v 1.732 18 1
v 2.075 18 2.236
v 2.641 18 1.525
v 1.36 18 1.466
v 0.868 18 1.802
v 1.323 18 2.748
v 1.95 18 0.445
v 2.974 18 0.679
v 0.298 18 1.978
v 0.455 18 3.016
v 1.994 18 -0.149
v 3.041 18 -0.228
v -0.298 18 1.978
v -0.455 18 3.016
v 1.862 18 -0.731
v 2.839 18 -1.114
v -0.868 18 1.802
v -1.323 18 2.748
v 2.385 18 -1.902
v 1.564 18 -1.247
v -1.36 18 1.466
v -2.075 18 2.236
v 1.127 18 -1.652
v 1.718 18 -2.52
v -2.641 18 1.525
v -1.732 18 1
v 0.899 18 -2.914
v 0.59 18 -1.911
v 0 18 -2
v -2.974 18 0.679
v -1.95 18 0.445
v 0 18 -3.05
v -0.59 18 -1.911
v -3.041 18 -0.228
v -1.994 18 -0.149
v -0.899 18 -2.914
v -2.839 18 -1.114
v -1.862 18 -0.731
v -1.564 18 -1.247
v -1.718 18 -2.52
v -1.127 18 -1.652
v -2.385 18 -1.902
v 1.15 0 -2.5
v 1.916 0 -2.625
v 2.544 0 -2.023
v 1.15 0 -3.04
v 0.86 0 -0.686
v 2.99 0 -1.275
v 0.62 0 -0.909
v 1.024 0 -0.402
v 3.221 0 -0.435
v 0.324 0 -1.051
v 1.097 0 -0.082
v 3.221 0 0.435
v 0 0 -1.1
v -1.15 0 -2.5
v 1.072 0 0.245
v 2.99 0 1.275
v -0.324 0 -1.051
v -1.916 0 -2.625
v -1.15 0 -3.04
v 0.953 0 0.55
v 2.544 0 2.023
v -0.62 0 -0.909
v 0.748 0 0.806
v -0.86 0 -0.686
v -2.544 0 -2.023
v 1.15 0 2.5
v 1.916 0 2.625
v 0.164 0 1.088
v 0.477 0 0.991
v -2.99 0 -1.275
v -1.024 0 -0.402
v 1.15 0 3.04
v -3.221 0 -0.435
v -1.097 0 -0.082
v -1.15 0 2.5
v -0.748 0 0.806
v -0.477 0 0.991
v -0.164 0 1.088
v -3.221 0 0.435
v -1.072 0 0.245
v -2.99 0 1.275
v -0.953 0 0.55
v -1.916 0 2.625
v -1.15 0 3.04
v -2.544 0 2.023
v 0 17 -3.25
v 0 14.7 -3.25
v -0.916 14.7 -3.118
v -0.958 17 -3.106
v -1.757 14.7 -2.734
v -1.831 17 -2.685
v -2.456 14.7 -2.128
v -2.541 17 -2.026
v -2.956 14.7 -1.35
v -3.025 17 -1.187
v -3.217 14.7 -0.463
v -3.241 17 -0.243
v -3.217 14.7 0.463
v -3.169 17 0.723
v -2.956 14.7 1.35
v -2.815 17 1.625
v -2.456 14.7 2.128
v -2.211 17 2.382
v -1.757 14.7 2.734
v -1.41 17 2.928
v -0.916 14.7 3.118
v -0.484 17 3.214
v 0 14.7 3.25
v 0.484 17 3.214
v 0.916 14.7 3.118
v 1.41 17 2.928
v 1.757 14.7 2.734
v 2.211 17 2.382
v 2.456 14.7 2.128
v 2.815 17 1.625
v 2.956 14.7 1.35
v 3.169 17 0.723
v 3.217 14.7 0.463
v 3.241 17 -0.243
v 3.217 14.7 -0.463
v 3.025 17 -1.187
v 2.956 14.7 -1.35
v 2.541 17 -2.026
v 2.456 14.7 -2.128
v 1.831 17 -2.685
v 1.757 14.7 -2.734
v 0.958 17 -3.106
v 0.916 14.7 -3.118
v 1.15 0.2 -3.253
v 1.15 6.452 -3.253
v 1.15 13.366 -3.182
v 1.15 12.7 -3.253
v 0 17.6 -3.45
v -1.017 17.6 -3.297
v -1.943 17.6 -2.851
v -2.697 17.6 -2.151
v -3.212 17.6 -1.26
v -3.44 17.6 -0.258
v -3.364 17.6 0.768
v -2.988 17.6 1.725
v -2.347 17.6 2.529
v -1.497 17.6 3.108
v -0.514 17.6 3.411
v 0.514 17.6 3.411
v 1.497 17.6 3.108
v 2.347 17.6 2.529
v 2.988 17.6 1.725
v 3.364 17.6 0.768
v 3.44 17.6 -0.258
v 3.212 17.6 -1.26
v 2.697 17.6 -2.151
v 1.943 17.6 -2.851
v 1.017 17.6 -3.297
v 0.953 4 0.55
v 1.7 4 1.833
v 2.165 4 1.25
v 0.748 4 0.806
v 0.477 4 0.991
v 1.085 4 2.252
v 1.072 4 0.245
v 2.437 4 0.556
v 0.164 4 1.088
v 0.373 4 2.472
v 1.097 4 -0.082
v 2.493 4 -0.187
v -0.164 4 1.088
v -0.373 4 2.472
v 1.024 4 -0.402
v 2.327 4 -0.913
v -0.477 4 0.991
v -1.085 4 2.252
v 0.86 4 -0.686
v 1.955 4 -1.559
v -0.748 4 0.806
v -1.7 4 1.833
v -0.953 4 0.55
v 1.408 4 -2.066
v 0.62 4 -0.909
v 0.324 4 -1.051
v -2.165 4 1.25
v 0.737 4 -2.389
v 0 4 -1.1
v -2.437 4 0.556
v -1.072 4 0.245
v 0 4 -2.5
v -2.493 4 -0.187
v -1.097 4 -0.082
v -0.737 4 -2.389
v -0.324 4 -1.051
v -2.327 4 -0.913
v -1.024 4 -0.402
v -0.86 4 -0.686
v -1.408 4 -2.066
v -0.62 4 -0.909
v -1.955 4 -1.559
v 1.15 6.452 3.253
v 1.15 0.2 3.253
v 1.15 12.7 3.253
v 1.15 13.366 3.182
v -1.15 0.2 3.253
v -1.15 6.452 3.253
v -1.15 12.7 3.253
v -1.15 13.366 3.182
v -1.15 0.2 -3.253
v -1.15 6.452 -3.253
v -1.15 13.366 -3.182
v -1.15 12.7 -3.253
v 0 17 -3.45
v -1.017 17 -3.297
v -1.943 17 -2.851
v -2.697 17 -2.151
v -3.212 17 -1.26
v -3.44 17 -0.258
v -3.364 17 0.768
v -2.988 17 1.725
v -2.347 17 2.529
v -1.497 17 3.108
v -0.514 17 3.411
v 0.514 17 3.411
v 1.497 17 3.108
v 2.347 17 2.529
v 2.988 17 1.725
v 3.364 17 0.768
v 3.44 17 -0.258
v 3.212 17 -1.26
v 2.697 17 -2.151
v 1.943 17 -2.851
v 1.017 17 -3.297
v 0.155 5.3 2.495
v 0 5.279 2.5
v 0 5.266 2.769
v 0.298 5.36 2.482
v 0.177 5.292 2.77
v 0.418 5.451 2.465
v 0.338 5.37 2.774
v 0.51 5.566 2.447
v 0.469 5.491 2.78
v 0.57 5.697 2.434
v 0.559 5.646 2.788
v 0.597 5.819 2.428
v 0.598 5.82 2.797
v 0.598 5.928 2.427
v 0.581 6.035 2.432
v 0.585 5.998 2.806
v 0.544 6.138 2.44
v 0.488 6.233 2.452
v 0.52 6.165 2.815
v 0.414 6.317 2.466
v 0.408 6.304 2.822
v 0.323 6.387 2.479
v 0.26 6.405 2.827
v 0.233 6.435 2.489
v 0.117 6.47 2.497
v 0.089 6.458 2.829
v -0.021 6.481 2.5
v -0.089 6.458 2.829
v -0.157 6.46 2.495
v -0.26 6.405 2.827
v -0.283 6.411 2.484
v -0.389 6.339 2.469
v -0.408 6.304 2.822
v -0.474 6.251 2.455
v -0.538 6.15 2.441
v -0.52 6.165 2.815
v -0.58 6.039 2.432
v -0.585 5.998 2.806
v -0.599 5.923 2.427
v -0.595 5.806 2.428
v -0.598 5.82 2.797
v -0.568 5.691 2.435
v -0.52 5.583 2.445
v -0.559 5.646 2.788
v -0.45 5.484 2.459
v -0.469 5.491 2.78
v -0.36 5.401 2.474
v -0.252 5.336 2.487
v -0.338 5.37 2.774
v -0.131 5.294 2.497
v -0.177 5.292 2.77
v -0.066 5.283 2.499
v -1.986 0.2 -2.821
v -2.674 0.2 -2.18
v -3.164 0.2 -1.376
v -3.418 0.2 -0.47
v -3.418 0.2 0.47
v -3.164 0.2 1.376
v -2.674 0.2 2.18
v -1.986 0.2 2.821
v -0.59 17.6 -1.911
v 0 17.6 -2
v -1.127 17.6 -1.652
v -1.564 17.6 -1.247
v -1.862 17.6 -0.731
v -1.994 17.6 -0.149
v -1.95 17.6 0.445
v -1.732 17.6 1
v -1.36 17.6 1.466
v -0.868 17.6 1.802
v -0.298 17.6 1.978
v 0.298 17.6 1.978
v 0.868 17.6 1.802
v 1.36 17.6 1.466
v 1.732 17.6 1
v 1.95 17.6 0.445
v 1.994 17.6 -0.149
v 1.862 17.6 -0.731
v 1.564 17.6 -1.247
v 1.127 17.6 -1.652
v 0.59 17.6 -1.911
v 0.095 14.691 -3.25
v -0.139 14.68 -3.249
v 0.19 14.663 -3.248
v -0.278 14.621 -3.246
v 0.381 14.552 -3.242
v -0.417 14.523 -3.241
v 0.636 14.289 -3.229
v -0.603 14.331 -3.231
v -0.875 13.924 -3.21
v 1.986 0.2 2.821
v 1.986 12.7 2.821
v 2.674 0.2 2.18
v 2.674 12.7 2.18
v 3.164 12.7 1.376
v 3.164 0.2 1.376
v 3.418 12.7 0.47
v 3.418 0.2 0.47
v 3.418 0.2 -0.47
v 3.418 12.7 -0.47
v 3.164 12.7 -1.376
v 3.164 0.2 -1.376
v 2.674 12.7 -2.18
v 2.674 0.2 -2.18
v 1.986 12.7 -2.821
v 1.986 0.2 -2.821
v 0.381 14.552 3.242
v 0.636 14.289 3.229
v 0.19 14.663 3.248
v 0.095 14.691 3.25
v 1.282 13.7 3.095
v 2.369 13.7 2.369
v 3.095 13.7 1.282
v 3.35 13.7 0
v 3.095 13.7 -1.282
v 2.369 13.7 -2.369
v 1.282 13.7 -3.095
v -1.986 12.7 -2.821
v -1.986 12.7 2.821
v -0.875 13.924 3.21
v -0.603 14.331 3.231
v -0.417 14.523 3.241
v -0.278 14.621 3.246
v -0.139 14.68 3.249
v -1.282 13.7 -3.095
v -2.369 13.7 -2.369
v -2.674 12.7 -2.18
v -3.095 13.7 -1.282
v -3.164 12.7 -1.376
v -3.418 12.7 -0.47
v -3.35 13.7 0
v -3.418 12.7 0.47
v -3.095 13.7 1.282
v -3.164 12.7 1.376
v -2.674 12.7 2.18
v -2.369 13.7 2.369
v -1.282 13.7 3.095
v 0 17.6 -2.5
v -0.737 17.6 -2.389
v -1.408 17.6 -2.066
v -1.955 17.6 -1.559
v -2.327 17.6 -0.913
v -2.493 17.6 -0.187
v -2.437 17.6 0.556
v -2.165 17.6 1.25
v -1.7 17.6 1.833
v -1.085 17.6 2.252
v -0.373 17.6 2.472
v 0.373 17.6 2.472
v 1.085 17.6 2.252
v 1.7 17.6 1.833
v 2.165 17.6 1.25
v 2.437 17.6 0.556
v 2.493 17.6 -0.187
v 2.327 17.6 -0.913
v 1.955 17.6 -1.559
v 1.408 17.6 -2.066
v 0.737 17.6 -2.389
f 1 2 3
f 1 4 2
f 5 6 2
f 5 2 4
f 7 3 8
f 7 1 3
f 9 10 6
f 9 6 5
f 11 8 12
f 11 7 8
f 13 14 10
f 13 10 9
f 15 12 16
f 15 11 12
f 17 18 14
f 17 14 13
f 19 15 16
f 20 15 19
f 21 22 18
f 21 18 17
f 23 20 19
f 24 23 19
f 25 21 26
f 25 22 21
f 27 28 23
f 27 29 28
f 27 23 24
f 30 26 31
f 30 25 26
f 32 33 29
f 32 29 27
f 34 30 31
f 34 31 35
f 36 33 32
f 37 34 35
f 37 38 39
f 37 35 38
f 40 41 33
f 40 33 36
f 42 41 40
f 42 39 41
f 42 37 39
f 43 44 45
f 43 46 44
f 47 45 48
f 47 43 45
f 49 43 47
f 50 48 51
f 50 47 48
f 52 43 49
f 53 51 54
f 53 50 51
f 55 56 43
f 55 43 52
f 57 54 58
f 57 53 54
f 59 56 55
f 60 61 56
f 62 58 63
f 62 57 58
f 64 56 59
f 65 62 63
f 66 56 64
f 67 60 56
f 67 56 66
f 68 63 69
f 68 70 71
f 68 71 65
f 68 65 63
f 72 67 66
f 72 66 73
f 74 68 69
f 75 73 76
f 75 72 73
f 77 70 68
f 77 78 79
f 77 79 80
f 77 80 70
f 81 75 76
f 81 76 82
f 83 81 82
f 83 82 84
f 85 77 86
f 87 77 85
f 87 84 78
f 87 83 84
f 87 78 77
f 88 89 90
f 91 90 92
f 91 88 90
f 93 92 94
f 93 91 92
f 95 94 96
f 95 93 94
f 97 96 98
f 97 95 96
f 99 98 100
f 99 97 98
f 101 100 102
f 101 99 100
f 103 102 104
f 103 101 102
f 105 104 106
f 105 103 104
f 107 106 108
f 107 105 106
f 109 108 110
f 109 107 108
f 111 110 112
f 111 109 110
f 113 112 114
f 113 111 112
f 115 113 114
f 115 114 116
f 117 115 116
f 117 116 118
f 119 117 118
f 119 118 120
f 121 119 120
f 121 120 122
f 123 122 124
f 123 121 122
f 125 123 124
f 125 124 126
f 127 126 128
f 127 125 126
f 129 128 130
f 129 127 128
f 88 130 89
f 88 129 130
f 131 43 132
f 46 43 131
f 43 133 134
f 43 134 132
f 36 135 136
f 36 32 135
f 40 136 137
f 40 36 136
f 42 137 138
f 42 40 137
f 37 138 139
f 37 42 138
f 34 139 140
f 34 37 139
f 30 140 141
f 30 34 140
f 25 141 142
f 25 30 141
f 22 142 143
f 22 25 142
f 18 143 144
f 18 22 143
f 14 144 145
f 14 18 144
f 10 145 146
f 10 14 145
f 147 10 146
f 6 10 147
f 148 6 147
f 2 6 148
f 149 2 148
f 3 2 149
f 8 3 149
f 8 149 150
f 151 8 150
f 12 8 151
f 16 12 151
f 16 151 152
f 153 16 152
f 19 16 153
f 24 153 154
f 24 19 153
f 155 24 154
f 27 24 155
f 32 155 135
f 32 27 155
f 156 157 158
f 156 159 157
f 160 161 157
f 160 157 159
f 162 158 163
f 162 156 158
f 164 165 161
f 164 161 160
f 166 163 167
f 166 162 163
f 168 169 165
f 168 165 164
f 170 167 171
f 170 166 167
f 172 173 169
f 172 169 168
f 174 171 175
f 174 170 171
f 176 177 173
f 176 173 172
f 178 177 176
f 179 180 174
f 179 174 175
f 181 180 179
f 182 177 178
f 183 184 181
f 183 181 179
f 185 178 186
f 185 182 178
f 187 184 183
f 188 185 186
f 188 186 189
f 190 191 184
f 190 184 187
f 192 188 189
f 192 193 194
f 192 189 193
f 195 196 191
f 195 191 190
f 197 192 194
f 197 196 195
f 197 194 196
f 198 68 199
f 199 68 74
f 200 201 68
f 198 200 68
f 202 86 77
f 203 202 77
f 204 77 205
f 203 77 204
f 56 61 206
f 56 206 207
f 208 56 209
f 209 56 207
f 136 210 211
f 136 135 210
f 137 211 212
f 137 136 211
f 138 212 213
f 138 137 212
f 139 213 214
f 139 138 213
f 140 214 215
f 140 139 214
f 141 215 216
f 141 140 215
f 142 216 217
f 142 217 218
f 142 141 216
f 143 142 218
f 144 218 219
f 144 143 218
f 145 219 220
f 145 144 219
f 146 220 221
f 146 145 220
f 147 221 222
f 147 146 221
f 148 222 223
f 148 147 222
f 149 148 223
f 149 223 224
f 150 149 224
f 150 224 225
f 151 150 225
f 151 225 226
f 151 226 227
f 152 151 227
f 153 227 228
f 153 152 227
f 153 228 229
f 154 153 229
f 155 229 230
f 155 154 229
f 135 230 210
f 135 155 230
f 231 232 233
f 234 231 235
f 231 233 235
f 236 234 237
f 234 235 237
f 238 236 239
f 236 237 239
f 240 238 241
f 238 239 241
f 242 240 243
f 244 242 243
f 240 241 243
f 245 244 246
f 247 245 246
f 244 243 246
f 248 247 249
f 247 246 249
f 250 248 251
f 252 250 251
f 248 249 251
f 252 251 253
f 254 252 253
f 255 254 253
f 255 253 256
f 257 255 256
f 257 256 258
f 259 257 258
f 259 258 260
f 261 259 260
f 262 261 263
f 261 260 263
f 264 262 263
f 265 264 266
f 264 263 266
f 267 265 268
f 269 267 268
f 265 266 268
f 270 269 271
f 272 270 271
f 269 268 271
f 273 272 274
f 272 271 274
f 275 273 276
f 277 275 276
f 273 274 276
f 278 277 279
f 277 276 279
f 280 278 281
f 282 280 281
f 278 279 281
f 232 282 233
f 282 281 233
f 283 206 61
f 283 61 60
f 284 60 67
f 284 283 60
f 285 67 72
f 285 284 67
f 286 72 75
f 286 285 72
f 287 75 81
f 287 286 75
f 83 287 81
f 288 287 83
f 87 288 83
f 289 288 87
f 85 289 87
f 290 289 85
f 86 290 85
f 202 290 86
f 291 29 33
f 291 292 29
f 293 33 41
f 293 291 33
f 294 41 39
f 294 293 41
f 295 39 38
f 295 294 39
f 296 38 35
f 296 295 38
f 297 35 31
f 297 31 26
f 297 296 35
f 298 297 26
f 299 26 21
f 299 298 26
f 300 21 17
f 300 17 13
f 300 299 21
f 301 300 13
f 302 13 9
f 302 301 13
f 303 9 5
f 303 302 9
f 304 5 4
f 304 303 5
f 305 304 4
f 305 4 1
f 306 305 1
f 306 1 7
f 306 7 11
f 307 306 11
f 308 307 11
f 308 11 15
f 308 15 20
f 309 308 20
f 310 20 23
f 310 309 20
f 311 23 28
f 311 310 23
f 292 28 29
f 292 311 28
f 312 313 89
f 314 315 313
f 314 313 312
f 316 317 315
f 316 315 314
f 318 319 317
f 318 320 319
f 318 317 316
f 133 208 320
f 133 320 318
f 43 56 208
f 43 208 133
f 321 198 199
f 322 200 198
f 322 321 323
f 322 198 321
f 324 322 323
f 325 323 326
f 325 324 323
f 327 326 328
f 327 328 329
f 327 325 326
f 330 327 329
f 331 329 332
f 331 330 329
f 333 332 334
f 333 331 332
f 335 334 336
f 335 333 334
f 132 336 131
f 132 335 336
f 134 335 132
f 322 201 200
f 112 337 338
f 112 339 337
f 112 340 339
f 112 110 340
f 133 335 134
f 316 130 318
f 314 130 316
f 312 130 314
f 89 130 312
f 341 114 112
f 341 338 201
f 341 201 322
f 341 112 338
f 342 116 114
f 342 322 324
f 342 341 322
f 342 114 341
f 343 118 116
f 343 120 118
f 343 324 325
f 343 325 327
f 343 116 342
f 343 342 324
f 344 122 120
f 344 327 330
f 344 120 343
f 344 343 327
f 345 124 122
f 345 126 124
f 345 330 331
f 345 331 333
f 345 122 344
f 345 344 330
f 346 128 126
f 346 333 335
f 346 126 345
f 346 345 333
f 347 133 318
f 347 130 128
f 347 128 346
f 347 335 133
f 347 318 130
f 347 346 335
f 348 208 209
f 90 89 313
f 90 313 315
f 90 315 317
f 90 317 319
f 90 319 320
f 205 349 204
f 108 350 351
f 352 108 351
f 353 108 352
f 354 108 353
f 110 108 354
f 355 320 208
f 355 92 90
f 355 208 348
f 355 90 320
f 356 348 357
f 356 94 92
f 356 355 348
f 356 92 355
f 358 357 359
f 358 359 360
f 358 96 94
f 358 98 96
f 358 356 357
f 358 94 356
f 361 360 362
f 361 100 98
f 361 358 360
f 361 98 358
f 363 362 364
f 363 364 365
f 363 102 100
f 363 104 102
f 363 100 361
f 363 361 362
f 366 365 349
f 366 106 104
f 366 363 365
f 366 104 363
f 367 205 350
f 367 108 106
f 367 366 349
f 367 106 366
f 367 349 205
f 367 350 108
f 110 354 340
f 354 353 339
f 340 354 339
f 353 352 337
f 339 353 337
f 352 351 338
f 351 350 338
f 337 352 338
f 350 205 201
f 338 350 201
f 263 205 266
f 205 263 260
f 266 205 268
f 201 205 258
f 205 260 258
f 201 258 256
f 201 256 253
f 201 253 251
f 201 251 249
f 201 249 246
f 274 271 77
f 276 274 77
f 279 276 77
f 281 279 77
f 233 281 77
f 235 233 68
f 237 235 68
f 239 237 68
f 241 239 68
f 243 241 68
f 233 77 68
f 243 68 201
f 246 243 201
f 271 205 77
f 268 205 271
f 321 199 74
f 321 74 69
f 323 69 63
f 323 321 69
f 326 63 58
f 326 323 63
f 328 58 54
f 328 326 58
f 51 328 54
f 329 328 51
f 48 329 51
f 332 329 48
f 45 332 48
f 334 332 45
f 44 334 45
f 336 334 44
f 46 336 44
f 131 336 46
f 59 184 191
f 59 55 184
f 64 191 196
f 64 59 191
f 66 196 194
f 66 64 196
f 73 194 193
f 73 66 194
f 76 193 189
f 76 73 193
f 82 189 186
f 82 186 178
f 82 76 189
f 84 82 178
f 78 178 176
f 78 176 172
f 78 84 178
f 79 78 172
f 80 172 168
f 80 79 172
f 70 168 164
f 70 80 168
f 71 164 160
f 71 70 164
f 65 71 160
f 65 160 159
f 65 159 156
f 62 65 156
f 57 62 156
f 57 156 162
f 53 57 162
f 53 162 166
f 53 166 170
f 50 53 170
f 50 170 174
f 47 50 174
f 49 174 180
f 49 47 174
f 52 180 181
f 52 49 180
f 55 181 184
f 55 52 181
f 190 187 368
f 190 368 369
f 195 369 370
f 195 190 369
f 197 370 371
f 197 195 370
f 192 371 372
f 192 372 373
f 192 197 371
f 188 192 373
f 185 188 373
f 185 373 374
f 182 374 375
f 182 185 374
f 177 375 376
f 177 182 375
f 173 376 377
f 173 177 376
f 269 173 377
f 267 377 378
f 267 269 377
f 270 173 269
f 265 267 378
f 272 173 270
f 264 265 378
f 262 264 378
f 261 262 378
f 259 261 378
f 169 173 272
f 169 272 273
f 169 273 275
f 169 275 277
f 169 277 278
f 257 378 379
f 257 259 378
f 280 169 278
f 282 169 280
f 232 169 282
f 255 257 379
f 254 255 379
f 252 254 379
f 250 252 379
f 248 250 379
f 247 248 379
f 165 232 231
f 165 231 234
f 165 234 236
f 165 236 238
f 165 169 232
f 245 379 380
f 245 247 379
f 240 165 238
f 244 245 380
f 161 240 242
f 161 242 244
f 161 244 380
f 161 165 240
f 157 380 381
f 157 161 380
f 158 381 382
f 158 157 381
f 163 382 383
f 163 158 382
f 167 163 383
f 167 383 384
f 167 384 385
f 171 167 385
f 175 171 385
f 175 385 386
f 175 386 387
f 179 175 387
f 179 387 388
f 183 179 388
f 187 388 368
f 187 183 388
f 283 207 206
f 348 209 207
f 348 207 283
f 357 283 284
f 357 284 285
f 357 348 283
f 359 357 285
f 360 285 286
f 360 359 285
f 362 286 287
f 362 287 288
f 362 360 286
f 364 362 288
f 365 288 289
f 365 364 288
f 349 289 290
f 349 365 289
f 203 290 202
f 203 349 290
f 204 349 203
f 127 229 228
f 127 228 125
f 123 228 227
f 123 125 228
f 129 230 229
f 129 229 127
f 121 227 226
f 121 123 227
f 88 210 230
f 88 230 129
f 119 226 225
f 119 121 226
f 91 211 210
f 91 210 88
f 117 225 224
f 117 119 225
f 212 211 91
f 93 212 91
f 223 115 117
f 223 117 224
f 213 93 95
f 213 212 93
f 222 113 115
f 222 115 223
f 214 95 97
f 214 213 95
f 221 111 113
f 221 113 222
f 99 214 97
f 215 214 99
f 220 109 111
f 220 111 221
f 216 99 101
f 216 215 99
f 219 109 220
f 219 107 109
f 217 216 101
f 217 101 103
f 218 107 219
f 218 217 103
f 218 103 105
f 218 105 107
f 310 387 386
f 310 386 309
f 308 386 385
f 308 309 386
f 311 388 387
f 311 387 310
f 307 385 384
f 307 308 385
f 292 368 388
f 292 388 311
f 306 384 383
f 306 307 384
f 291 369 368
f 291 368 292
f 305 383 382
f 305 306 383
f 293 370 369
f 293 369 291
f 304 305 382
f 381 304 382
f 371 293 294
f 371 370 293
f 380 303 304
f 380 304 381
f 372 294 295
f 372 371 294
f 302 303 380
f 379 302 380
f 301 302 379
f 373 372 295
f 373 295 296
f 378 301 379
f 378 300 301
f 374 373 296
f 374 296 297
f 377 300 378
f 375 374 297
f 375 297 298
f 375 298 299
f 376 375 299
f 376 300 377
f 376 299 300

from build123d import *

# Parameters (mm, degrees)
LOCATING_HOLE_REACH      = 21.386
LOCATING_HOLE_END_RADIUS = 2.5
LOCATINGHOLES_R          = 0.6


with BuildPart() as part:
    # MainBodyS → MAIN BODY (revolve)
    with BuildSketch(Plane.XY, mode=Mode.PRIVATE) as main_body_sk:
        Polygon((3.45, 0.2), (3.45, 12.7), (3.25, 14.7), (3.25, 17), (3.45, 17), (3.45, 17.6), (3.05, 18), (2, 18), (2, 17.6), (2.5, 17.6), (2.5, 4), (1.1, 4), (1.1, 0), (3.25, 0), align=None)
    revolve(main_body_sk.sketch.rotate(Axis((0, 0, 0), (0, 1, 0)), 90), axis=Axis((0, 0, 0), (0, 1, 0)))

    # LoftedSlotEndS → LOFTED SLOT section 0
    with BuildSketch(Plane(origin=(0, 14.7, 0), x_dir=(-1, 0, 0), z_dir=(0, -1, 0))):
        with BuildLine():
            Line((-1.15, 3.75), (1.15, 3.75))
            Line((1.15, 3.75), (1.15, 3.25))
            Line((1.15, 3.25), (-1.15, 3.25))
            Line((-1.15, 3.25), (-1.15, 3.75))
        make_face()
    # LoftedSlotStartS → LOFTED SLOT section 1
    with BuildSketch(Plane(origin=(0, 0, 0), x_dir=(-1, 0, 0), z_dir=(0, -1, 0))):
        with BuildLine():
            Line((-1.15, 3.45), (1.15, 3.45))
            Line((1.15, 3.45), (1.15, 2.5))
            Line((1.15, 2.5), (-1.15, 2.5))
            Line((-1.15, 2.5), (-1.15, 3.45))
        make_face()
    lofted_slot = loft(mode=Mode.SUBTRACT)

    # LS HM: LOFTED SLOT across plane
    add(lofted_slot.mirror(Plane.XY), mode=Mode.SUBTRACT)

    # LOCATING HOLE: up to this cylinder (the profile starts outside it)
    locating_hole_end = Plane(origin=(0, 5.864986, 0), z_dir=(0, -1, 0)) * Cylinder(LOCATING_HOLE_END_RADIUS, 48.772, mode=Mode.PRIVATE)
    # LocatingHoleS → LOCATING HOLE (cut, up to the surface)
    with BuildSketch(Plane(origin=(0, -0.127219857, 2.493509191), x_dir=(1, 0, 0), z_dir=(0, -0.050954132371911015, 0.9987009944894546)), mode=Mode.PRIVATE) as locating_hole_sk1:
        with Locations(Location((0, 6, 0), (0, 0, 270))):
            Circle(LOCATINGHOLES_R)
    locating_hole_tool1 = extrude(locating_hole_sk1.sketch, amount=-LOCATING_HOLE_REACH, mode=Mode.PRIVATE) - locating_hole_end
    add(locating_hole_tool1.solids().sort_by_distance((0, 5.864986, 2.799234))[0], mode=Mode.SUBTRACT)


solid = part.part
